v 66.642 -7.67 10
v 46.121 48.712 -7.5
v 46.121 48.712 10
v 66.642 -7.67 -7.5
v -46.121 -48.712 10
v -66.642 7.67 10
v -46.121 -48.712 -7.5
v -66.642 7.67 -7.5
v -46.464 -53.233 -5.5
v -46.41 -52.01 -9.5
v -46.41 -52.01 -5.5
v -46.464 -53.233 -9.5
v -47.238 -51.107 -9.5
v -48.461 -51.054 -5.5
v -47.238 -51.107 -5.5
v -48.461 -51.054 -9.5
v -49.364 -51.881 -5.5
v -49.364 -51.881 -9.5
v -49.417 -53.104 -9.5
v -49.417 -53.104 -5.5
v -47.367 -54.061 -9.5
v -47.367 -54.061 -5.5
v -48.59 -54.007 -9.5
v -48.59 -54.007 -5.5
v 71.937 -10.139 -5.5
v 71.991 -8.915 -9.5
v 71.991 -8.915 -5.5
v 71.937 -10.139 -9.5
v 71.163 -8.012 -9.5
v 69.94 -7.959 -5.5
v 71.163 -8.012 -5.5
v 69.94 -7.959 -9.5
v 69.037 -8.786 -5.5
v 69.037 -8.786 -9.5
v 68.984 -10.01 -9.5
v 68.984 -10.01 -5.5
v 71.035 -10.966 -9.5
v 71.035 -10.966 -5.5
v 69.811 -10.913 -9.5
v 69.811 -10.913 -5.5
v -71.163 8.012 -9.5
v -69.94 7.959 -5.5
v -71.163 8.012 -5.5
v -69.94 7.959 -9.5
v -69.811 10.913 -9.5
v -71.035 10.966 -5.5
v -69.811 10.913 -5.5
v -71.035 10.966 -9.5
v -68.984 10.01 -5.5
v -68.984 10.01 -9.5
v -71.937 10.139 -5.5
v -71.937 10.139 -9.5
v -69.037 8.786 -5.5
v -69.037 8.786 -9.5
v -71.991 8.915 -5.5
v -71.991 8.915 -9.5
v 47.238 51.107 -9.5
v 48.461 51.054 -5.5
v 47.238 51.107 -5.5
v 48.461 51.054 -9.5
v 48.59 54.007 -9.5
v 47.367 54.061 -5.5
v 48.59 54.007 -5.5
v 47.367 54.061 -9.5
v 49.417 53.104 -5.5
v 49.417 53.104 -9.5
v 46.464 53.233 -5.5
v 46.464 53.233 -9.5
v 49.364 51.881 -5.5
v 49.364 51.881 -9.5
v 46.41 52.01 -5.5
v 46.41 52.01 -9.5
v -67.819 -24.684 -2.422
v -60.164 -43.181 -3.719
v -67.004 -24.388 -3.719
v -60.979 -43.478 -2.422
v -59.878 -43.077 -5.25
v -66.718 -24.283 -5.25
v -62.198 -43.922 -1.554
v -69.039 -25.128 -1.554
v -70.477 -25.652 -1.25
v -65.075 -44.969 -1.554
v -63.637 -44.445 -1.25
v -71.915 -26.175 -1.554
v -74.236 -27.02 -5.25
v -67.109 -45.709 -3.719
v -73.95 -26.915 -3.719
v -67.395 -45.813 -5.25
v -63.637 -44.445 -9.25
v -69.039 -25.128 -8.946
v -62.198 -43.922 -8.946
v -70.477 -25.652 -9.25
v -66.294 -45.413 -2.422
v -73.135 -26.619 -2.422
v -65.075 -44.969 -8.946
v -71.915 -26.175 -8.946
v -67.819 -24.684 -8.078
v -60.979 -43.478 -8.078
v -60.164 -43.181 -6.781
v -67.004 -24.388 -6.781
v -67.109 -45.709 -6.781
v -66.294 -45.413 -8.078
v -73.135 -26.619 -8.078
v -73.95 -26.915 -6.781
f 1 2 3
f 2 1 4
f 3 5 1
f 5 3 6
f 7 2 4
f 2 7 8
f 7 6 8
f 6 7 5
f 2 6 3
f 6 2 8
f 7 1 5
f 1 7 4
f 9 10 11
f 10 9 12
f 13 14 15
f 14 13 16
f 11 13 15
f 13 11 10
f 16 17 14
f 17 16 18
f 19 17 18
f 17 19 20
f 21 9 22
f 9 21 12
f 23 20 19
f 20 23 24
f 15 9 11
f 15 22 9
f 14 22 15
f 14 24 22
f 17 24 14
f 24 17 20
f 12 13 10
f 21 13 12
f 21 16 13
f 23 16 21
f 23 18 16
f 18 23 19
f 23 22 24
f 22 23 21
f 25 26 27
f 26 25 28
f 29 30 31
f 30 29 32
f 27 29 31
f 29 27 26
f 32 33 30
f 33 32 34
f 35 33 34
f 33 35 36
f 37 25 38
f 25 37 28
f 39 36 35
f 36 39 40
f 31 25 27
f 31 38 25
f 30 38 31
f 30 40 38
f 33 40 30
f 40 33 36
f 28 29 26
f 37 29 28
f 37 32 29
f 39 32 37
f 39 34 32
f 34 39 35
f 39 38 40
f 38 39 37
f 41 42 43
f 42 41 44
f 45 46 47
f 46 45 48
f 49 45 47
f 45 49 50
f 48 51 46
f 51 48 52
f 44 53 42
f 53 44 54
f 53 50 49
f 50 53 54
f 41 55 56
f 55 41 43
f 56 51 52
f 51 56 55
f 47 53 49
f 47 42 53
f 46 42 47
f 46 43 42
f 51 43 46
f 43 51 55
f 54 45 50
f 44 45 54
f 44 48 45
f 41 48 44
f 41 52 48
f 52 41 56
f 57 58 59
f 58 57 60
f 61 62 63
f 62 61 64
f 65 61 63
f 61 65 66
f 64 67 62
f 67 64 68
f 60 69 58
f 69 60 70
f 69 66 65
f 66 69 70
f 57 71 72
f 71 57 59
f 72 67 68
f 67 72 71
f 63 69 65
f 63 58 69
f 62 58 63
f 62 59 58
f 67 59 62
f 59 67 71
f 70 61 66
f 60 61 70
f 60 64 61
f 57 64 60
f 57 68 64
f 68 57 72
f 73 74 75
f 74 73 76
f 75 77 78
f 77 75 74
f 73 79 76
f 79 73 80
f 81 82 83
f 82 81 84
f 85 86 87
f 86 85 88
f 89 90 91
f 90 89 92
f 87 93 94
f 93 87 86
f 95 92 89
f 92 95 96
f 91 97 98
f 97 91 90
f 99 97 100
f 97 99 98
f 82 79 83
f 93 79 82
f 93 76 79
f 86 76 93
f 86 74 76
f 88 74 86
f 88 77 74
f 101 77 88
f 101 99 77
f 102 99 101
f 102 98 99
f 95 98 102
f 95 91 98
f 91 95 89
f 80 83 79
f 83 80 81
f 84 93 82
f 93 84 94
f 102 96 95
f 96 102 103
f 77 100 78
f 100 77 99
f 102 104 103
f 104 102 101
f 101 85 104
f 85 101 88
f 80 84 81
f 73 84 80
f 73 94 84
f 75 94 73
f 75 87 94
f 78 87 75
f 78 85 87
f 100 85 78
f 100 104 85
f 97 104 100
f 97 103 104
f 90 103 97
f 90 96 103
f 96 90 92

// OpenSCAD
// Inclined Density Sorting Channel
// HUSKY-SORTER-001 | Topic 4 Day 1 | 2026-04-14
// Design: 60×10mm channel (best for 5015 fan, 2-way separation)
// Future upgrade: turbo blower (300+L/min) for 3-way separation
//
// v2 2026-05-17: Plenum moved BELOW channel, nozzles blow UPWARD through floor
// Previous: plenum was on side wall, nozzles blew sideways (rotate[90,0,0] error)

channel_L = 120;
channel_W = 60;
channel_H = 10;
wall      = 2;
plenum_W  = 15;
plenum_H  = 6;
floor_H   = 1.5;
slope_deg = 20;

rotate([0, 0, slope_deg]) {
    // Outer body: plenum below + channel above, separated by floor
    // Local z=0 is bottom of plenum; channel floor at z=plenum_H to z=plenum_H+floor_H
    translate([-channel_L/2, -channel_W/2, -(plenum_H + floor_H)])
        cube([channel_L, channel_W, channel_H + floor_H + plenum_H]);

    difference() {
        // Outer shell
        translate([-channel_L/2, -channel_W/2, -(plenum_H + floor_H)])
            cube([channel_L, channel_W, channel_H + floor_H + plenum_H]);

        // Plenum cavity (bottom section, below floor)
        translate([-channel_L/2+wall, -channel_W/2+wall, -plenum_H-floor_H+wall])
            cube([channel_L-2*wall, channel_W-2*wall, plenum_H-wall]);

        // Channel interior (above floor)
        translate([-channel_L/2+wall, -channel_W/2+wall, floor_H])
            cube([channel_L-2*wall, channel_W-2*wall, channel_H]);
    }

    // Nozzle holes: vertical (Z-axis) through floor, connecting plenum to channel
    // Each nozzle is a vertical cylinder punching through the floor layer
    for (i=[0:11]) {
        x = -channel_L/2 + (i+0.5)*(channel_L/12);
        translate([x, 0, -plenum_H])
            cylinder(h=plenum_H + floor_H + 2, d=2.0, $fn=8);
    }

    // Air inlet: horizontal cylinder from front face into plenum
    translate([-channel_L/2-15, 0, -(plenum_H+floor_H)/2 - floor_H])
        rotate([90, 0, 0]) cylinder(h=20, d=8, $fn=16);

    // Zone guide ridge
    translate([-channel_L/2+2, -channel_W/2+channel_W/2-0.25, 0])
        cube([channel_L-4, 0.5, 2]);

    // Mounting flanges (4x M3)
    for (pt=[[-channel_L/2-3,-channel_W/2-3],[ channel_L/2+3,-channel_W/2-3],
              [-channel_L/2-3, channel_W/2+3],[ channel_L/2+3, channel_W/2+3]])
        translate([pt[0], pt[1], -(plenum_H+floor_H)-2])
            cylinder(h=4, d=3.2, $fn=8);
}
echo(str("Density Channel v2: ", channel_W, "x", channel_H, "mm, slope=", slope_deg, "deg, plenum-below"));
